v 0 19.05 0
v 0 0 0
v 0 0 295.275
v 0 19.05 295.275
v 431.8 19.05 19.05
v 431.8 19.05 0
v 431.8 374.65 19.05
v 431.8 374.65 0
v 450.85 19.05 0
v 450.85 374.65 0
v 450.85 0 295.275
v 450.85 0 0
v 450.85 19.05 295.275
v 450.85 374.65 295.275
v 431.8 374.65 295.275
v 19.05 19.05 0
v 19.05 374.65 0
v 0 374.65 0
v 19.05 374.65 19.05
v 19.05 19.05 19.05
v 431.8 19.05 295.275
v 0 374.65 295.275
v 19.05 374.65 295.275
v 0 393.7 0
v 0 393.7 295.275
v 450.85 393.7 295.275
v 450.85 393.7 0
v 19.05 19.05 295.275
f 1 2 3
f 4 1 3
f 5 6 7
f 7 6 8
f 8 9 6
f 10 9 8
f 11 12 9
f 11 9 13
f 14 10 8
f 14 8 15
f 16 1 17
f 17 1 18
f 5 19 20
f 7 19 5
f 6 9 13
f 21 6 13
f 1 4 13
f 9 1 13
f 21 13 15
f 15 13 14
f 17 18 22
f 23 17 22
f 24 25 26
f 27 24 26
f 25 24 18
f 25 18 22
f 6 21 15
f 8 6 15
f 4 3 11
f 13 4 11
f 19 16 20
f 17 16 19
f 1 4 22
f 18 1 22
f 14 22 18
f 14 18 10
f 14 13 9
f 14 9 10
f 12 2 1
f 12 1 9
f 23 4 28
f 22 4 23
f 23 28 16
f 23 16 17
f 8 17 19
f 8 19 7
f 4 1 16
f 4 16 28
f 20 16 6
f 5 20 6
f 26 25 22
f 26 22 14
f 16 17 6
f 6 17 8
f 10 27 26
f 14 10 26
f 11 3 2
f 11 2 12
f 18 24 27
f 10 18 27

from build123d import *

# Parameters (mm, degrees)
F0_W     = 450.85
F0_H     = 295.275
F1_DEPTH = 19.05
F2_W     = 355.6
F2_H     = 295.275
F3_DEPTH = 19.05
F8_W     = 412.75
F8_H     = 355.6
F9_DEPTH = 19.05


with BuildPart() as f1:
    # F0 (on Front) → F1 (new body)
    with BuildSketch(Plane.XZ):
        with Locations((225.425, 147.6375)):
            Rectangle(F0_W, F0_H)
    extrude(amount=-F1_DEPTH)


with BuildPart() as f3:
    # F2 (on Right) → F3 (new body)
    with BuildSketch(Plane.YZ):
        with Locations((196.85, 147.6375)):
            Rectangle(F2_W, F2_H)
    extrude(amount=F3_DEPTH)


with BuildPart() as f5_1:
    # F5: instance of F1
    add(f1.part.mirror(Plane.XZ.offset(-196.85)))


with BuildPart() as f7_1:
    # F7: instance of F3
    add(f3.part.mirror(Plane.YZ.offset(225.425)))


with BuildPart() as f9:
    # F8 (on Top) → F9 (new body)
    with BuildSketch(Plane.XY):
        with Locations((225.425, 196.85)):
            Rectangle(F8_W, F8_H)
    extrude(amount=F9_DEPTH)


solid = Compound([f1.part, f3.part, f5_1.part, f7_1.part, f9.part])
